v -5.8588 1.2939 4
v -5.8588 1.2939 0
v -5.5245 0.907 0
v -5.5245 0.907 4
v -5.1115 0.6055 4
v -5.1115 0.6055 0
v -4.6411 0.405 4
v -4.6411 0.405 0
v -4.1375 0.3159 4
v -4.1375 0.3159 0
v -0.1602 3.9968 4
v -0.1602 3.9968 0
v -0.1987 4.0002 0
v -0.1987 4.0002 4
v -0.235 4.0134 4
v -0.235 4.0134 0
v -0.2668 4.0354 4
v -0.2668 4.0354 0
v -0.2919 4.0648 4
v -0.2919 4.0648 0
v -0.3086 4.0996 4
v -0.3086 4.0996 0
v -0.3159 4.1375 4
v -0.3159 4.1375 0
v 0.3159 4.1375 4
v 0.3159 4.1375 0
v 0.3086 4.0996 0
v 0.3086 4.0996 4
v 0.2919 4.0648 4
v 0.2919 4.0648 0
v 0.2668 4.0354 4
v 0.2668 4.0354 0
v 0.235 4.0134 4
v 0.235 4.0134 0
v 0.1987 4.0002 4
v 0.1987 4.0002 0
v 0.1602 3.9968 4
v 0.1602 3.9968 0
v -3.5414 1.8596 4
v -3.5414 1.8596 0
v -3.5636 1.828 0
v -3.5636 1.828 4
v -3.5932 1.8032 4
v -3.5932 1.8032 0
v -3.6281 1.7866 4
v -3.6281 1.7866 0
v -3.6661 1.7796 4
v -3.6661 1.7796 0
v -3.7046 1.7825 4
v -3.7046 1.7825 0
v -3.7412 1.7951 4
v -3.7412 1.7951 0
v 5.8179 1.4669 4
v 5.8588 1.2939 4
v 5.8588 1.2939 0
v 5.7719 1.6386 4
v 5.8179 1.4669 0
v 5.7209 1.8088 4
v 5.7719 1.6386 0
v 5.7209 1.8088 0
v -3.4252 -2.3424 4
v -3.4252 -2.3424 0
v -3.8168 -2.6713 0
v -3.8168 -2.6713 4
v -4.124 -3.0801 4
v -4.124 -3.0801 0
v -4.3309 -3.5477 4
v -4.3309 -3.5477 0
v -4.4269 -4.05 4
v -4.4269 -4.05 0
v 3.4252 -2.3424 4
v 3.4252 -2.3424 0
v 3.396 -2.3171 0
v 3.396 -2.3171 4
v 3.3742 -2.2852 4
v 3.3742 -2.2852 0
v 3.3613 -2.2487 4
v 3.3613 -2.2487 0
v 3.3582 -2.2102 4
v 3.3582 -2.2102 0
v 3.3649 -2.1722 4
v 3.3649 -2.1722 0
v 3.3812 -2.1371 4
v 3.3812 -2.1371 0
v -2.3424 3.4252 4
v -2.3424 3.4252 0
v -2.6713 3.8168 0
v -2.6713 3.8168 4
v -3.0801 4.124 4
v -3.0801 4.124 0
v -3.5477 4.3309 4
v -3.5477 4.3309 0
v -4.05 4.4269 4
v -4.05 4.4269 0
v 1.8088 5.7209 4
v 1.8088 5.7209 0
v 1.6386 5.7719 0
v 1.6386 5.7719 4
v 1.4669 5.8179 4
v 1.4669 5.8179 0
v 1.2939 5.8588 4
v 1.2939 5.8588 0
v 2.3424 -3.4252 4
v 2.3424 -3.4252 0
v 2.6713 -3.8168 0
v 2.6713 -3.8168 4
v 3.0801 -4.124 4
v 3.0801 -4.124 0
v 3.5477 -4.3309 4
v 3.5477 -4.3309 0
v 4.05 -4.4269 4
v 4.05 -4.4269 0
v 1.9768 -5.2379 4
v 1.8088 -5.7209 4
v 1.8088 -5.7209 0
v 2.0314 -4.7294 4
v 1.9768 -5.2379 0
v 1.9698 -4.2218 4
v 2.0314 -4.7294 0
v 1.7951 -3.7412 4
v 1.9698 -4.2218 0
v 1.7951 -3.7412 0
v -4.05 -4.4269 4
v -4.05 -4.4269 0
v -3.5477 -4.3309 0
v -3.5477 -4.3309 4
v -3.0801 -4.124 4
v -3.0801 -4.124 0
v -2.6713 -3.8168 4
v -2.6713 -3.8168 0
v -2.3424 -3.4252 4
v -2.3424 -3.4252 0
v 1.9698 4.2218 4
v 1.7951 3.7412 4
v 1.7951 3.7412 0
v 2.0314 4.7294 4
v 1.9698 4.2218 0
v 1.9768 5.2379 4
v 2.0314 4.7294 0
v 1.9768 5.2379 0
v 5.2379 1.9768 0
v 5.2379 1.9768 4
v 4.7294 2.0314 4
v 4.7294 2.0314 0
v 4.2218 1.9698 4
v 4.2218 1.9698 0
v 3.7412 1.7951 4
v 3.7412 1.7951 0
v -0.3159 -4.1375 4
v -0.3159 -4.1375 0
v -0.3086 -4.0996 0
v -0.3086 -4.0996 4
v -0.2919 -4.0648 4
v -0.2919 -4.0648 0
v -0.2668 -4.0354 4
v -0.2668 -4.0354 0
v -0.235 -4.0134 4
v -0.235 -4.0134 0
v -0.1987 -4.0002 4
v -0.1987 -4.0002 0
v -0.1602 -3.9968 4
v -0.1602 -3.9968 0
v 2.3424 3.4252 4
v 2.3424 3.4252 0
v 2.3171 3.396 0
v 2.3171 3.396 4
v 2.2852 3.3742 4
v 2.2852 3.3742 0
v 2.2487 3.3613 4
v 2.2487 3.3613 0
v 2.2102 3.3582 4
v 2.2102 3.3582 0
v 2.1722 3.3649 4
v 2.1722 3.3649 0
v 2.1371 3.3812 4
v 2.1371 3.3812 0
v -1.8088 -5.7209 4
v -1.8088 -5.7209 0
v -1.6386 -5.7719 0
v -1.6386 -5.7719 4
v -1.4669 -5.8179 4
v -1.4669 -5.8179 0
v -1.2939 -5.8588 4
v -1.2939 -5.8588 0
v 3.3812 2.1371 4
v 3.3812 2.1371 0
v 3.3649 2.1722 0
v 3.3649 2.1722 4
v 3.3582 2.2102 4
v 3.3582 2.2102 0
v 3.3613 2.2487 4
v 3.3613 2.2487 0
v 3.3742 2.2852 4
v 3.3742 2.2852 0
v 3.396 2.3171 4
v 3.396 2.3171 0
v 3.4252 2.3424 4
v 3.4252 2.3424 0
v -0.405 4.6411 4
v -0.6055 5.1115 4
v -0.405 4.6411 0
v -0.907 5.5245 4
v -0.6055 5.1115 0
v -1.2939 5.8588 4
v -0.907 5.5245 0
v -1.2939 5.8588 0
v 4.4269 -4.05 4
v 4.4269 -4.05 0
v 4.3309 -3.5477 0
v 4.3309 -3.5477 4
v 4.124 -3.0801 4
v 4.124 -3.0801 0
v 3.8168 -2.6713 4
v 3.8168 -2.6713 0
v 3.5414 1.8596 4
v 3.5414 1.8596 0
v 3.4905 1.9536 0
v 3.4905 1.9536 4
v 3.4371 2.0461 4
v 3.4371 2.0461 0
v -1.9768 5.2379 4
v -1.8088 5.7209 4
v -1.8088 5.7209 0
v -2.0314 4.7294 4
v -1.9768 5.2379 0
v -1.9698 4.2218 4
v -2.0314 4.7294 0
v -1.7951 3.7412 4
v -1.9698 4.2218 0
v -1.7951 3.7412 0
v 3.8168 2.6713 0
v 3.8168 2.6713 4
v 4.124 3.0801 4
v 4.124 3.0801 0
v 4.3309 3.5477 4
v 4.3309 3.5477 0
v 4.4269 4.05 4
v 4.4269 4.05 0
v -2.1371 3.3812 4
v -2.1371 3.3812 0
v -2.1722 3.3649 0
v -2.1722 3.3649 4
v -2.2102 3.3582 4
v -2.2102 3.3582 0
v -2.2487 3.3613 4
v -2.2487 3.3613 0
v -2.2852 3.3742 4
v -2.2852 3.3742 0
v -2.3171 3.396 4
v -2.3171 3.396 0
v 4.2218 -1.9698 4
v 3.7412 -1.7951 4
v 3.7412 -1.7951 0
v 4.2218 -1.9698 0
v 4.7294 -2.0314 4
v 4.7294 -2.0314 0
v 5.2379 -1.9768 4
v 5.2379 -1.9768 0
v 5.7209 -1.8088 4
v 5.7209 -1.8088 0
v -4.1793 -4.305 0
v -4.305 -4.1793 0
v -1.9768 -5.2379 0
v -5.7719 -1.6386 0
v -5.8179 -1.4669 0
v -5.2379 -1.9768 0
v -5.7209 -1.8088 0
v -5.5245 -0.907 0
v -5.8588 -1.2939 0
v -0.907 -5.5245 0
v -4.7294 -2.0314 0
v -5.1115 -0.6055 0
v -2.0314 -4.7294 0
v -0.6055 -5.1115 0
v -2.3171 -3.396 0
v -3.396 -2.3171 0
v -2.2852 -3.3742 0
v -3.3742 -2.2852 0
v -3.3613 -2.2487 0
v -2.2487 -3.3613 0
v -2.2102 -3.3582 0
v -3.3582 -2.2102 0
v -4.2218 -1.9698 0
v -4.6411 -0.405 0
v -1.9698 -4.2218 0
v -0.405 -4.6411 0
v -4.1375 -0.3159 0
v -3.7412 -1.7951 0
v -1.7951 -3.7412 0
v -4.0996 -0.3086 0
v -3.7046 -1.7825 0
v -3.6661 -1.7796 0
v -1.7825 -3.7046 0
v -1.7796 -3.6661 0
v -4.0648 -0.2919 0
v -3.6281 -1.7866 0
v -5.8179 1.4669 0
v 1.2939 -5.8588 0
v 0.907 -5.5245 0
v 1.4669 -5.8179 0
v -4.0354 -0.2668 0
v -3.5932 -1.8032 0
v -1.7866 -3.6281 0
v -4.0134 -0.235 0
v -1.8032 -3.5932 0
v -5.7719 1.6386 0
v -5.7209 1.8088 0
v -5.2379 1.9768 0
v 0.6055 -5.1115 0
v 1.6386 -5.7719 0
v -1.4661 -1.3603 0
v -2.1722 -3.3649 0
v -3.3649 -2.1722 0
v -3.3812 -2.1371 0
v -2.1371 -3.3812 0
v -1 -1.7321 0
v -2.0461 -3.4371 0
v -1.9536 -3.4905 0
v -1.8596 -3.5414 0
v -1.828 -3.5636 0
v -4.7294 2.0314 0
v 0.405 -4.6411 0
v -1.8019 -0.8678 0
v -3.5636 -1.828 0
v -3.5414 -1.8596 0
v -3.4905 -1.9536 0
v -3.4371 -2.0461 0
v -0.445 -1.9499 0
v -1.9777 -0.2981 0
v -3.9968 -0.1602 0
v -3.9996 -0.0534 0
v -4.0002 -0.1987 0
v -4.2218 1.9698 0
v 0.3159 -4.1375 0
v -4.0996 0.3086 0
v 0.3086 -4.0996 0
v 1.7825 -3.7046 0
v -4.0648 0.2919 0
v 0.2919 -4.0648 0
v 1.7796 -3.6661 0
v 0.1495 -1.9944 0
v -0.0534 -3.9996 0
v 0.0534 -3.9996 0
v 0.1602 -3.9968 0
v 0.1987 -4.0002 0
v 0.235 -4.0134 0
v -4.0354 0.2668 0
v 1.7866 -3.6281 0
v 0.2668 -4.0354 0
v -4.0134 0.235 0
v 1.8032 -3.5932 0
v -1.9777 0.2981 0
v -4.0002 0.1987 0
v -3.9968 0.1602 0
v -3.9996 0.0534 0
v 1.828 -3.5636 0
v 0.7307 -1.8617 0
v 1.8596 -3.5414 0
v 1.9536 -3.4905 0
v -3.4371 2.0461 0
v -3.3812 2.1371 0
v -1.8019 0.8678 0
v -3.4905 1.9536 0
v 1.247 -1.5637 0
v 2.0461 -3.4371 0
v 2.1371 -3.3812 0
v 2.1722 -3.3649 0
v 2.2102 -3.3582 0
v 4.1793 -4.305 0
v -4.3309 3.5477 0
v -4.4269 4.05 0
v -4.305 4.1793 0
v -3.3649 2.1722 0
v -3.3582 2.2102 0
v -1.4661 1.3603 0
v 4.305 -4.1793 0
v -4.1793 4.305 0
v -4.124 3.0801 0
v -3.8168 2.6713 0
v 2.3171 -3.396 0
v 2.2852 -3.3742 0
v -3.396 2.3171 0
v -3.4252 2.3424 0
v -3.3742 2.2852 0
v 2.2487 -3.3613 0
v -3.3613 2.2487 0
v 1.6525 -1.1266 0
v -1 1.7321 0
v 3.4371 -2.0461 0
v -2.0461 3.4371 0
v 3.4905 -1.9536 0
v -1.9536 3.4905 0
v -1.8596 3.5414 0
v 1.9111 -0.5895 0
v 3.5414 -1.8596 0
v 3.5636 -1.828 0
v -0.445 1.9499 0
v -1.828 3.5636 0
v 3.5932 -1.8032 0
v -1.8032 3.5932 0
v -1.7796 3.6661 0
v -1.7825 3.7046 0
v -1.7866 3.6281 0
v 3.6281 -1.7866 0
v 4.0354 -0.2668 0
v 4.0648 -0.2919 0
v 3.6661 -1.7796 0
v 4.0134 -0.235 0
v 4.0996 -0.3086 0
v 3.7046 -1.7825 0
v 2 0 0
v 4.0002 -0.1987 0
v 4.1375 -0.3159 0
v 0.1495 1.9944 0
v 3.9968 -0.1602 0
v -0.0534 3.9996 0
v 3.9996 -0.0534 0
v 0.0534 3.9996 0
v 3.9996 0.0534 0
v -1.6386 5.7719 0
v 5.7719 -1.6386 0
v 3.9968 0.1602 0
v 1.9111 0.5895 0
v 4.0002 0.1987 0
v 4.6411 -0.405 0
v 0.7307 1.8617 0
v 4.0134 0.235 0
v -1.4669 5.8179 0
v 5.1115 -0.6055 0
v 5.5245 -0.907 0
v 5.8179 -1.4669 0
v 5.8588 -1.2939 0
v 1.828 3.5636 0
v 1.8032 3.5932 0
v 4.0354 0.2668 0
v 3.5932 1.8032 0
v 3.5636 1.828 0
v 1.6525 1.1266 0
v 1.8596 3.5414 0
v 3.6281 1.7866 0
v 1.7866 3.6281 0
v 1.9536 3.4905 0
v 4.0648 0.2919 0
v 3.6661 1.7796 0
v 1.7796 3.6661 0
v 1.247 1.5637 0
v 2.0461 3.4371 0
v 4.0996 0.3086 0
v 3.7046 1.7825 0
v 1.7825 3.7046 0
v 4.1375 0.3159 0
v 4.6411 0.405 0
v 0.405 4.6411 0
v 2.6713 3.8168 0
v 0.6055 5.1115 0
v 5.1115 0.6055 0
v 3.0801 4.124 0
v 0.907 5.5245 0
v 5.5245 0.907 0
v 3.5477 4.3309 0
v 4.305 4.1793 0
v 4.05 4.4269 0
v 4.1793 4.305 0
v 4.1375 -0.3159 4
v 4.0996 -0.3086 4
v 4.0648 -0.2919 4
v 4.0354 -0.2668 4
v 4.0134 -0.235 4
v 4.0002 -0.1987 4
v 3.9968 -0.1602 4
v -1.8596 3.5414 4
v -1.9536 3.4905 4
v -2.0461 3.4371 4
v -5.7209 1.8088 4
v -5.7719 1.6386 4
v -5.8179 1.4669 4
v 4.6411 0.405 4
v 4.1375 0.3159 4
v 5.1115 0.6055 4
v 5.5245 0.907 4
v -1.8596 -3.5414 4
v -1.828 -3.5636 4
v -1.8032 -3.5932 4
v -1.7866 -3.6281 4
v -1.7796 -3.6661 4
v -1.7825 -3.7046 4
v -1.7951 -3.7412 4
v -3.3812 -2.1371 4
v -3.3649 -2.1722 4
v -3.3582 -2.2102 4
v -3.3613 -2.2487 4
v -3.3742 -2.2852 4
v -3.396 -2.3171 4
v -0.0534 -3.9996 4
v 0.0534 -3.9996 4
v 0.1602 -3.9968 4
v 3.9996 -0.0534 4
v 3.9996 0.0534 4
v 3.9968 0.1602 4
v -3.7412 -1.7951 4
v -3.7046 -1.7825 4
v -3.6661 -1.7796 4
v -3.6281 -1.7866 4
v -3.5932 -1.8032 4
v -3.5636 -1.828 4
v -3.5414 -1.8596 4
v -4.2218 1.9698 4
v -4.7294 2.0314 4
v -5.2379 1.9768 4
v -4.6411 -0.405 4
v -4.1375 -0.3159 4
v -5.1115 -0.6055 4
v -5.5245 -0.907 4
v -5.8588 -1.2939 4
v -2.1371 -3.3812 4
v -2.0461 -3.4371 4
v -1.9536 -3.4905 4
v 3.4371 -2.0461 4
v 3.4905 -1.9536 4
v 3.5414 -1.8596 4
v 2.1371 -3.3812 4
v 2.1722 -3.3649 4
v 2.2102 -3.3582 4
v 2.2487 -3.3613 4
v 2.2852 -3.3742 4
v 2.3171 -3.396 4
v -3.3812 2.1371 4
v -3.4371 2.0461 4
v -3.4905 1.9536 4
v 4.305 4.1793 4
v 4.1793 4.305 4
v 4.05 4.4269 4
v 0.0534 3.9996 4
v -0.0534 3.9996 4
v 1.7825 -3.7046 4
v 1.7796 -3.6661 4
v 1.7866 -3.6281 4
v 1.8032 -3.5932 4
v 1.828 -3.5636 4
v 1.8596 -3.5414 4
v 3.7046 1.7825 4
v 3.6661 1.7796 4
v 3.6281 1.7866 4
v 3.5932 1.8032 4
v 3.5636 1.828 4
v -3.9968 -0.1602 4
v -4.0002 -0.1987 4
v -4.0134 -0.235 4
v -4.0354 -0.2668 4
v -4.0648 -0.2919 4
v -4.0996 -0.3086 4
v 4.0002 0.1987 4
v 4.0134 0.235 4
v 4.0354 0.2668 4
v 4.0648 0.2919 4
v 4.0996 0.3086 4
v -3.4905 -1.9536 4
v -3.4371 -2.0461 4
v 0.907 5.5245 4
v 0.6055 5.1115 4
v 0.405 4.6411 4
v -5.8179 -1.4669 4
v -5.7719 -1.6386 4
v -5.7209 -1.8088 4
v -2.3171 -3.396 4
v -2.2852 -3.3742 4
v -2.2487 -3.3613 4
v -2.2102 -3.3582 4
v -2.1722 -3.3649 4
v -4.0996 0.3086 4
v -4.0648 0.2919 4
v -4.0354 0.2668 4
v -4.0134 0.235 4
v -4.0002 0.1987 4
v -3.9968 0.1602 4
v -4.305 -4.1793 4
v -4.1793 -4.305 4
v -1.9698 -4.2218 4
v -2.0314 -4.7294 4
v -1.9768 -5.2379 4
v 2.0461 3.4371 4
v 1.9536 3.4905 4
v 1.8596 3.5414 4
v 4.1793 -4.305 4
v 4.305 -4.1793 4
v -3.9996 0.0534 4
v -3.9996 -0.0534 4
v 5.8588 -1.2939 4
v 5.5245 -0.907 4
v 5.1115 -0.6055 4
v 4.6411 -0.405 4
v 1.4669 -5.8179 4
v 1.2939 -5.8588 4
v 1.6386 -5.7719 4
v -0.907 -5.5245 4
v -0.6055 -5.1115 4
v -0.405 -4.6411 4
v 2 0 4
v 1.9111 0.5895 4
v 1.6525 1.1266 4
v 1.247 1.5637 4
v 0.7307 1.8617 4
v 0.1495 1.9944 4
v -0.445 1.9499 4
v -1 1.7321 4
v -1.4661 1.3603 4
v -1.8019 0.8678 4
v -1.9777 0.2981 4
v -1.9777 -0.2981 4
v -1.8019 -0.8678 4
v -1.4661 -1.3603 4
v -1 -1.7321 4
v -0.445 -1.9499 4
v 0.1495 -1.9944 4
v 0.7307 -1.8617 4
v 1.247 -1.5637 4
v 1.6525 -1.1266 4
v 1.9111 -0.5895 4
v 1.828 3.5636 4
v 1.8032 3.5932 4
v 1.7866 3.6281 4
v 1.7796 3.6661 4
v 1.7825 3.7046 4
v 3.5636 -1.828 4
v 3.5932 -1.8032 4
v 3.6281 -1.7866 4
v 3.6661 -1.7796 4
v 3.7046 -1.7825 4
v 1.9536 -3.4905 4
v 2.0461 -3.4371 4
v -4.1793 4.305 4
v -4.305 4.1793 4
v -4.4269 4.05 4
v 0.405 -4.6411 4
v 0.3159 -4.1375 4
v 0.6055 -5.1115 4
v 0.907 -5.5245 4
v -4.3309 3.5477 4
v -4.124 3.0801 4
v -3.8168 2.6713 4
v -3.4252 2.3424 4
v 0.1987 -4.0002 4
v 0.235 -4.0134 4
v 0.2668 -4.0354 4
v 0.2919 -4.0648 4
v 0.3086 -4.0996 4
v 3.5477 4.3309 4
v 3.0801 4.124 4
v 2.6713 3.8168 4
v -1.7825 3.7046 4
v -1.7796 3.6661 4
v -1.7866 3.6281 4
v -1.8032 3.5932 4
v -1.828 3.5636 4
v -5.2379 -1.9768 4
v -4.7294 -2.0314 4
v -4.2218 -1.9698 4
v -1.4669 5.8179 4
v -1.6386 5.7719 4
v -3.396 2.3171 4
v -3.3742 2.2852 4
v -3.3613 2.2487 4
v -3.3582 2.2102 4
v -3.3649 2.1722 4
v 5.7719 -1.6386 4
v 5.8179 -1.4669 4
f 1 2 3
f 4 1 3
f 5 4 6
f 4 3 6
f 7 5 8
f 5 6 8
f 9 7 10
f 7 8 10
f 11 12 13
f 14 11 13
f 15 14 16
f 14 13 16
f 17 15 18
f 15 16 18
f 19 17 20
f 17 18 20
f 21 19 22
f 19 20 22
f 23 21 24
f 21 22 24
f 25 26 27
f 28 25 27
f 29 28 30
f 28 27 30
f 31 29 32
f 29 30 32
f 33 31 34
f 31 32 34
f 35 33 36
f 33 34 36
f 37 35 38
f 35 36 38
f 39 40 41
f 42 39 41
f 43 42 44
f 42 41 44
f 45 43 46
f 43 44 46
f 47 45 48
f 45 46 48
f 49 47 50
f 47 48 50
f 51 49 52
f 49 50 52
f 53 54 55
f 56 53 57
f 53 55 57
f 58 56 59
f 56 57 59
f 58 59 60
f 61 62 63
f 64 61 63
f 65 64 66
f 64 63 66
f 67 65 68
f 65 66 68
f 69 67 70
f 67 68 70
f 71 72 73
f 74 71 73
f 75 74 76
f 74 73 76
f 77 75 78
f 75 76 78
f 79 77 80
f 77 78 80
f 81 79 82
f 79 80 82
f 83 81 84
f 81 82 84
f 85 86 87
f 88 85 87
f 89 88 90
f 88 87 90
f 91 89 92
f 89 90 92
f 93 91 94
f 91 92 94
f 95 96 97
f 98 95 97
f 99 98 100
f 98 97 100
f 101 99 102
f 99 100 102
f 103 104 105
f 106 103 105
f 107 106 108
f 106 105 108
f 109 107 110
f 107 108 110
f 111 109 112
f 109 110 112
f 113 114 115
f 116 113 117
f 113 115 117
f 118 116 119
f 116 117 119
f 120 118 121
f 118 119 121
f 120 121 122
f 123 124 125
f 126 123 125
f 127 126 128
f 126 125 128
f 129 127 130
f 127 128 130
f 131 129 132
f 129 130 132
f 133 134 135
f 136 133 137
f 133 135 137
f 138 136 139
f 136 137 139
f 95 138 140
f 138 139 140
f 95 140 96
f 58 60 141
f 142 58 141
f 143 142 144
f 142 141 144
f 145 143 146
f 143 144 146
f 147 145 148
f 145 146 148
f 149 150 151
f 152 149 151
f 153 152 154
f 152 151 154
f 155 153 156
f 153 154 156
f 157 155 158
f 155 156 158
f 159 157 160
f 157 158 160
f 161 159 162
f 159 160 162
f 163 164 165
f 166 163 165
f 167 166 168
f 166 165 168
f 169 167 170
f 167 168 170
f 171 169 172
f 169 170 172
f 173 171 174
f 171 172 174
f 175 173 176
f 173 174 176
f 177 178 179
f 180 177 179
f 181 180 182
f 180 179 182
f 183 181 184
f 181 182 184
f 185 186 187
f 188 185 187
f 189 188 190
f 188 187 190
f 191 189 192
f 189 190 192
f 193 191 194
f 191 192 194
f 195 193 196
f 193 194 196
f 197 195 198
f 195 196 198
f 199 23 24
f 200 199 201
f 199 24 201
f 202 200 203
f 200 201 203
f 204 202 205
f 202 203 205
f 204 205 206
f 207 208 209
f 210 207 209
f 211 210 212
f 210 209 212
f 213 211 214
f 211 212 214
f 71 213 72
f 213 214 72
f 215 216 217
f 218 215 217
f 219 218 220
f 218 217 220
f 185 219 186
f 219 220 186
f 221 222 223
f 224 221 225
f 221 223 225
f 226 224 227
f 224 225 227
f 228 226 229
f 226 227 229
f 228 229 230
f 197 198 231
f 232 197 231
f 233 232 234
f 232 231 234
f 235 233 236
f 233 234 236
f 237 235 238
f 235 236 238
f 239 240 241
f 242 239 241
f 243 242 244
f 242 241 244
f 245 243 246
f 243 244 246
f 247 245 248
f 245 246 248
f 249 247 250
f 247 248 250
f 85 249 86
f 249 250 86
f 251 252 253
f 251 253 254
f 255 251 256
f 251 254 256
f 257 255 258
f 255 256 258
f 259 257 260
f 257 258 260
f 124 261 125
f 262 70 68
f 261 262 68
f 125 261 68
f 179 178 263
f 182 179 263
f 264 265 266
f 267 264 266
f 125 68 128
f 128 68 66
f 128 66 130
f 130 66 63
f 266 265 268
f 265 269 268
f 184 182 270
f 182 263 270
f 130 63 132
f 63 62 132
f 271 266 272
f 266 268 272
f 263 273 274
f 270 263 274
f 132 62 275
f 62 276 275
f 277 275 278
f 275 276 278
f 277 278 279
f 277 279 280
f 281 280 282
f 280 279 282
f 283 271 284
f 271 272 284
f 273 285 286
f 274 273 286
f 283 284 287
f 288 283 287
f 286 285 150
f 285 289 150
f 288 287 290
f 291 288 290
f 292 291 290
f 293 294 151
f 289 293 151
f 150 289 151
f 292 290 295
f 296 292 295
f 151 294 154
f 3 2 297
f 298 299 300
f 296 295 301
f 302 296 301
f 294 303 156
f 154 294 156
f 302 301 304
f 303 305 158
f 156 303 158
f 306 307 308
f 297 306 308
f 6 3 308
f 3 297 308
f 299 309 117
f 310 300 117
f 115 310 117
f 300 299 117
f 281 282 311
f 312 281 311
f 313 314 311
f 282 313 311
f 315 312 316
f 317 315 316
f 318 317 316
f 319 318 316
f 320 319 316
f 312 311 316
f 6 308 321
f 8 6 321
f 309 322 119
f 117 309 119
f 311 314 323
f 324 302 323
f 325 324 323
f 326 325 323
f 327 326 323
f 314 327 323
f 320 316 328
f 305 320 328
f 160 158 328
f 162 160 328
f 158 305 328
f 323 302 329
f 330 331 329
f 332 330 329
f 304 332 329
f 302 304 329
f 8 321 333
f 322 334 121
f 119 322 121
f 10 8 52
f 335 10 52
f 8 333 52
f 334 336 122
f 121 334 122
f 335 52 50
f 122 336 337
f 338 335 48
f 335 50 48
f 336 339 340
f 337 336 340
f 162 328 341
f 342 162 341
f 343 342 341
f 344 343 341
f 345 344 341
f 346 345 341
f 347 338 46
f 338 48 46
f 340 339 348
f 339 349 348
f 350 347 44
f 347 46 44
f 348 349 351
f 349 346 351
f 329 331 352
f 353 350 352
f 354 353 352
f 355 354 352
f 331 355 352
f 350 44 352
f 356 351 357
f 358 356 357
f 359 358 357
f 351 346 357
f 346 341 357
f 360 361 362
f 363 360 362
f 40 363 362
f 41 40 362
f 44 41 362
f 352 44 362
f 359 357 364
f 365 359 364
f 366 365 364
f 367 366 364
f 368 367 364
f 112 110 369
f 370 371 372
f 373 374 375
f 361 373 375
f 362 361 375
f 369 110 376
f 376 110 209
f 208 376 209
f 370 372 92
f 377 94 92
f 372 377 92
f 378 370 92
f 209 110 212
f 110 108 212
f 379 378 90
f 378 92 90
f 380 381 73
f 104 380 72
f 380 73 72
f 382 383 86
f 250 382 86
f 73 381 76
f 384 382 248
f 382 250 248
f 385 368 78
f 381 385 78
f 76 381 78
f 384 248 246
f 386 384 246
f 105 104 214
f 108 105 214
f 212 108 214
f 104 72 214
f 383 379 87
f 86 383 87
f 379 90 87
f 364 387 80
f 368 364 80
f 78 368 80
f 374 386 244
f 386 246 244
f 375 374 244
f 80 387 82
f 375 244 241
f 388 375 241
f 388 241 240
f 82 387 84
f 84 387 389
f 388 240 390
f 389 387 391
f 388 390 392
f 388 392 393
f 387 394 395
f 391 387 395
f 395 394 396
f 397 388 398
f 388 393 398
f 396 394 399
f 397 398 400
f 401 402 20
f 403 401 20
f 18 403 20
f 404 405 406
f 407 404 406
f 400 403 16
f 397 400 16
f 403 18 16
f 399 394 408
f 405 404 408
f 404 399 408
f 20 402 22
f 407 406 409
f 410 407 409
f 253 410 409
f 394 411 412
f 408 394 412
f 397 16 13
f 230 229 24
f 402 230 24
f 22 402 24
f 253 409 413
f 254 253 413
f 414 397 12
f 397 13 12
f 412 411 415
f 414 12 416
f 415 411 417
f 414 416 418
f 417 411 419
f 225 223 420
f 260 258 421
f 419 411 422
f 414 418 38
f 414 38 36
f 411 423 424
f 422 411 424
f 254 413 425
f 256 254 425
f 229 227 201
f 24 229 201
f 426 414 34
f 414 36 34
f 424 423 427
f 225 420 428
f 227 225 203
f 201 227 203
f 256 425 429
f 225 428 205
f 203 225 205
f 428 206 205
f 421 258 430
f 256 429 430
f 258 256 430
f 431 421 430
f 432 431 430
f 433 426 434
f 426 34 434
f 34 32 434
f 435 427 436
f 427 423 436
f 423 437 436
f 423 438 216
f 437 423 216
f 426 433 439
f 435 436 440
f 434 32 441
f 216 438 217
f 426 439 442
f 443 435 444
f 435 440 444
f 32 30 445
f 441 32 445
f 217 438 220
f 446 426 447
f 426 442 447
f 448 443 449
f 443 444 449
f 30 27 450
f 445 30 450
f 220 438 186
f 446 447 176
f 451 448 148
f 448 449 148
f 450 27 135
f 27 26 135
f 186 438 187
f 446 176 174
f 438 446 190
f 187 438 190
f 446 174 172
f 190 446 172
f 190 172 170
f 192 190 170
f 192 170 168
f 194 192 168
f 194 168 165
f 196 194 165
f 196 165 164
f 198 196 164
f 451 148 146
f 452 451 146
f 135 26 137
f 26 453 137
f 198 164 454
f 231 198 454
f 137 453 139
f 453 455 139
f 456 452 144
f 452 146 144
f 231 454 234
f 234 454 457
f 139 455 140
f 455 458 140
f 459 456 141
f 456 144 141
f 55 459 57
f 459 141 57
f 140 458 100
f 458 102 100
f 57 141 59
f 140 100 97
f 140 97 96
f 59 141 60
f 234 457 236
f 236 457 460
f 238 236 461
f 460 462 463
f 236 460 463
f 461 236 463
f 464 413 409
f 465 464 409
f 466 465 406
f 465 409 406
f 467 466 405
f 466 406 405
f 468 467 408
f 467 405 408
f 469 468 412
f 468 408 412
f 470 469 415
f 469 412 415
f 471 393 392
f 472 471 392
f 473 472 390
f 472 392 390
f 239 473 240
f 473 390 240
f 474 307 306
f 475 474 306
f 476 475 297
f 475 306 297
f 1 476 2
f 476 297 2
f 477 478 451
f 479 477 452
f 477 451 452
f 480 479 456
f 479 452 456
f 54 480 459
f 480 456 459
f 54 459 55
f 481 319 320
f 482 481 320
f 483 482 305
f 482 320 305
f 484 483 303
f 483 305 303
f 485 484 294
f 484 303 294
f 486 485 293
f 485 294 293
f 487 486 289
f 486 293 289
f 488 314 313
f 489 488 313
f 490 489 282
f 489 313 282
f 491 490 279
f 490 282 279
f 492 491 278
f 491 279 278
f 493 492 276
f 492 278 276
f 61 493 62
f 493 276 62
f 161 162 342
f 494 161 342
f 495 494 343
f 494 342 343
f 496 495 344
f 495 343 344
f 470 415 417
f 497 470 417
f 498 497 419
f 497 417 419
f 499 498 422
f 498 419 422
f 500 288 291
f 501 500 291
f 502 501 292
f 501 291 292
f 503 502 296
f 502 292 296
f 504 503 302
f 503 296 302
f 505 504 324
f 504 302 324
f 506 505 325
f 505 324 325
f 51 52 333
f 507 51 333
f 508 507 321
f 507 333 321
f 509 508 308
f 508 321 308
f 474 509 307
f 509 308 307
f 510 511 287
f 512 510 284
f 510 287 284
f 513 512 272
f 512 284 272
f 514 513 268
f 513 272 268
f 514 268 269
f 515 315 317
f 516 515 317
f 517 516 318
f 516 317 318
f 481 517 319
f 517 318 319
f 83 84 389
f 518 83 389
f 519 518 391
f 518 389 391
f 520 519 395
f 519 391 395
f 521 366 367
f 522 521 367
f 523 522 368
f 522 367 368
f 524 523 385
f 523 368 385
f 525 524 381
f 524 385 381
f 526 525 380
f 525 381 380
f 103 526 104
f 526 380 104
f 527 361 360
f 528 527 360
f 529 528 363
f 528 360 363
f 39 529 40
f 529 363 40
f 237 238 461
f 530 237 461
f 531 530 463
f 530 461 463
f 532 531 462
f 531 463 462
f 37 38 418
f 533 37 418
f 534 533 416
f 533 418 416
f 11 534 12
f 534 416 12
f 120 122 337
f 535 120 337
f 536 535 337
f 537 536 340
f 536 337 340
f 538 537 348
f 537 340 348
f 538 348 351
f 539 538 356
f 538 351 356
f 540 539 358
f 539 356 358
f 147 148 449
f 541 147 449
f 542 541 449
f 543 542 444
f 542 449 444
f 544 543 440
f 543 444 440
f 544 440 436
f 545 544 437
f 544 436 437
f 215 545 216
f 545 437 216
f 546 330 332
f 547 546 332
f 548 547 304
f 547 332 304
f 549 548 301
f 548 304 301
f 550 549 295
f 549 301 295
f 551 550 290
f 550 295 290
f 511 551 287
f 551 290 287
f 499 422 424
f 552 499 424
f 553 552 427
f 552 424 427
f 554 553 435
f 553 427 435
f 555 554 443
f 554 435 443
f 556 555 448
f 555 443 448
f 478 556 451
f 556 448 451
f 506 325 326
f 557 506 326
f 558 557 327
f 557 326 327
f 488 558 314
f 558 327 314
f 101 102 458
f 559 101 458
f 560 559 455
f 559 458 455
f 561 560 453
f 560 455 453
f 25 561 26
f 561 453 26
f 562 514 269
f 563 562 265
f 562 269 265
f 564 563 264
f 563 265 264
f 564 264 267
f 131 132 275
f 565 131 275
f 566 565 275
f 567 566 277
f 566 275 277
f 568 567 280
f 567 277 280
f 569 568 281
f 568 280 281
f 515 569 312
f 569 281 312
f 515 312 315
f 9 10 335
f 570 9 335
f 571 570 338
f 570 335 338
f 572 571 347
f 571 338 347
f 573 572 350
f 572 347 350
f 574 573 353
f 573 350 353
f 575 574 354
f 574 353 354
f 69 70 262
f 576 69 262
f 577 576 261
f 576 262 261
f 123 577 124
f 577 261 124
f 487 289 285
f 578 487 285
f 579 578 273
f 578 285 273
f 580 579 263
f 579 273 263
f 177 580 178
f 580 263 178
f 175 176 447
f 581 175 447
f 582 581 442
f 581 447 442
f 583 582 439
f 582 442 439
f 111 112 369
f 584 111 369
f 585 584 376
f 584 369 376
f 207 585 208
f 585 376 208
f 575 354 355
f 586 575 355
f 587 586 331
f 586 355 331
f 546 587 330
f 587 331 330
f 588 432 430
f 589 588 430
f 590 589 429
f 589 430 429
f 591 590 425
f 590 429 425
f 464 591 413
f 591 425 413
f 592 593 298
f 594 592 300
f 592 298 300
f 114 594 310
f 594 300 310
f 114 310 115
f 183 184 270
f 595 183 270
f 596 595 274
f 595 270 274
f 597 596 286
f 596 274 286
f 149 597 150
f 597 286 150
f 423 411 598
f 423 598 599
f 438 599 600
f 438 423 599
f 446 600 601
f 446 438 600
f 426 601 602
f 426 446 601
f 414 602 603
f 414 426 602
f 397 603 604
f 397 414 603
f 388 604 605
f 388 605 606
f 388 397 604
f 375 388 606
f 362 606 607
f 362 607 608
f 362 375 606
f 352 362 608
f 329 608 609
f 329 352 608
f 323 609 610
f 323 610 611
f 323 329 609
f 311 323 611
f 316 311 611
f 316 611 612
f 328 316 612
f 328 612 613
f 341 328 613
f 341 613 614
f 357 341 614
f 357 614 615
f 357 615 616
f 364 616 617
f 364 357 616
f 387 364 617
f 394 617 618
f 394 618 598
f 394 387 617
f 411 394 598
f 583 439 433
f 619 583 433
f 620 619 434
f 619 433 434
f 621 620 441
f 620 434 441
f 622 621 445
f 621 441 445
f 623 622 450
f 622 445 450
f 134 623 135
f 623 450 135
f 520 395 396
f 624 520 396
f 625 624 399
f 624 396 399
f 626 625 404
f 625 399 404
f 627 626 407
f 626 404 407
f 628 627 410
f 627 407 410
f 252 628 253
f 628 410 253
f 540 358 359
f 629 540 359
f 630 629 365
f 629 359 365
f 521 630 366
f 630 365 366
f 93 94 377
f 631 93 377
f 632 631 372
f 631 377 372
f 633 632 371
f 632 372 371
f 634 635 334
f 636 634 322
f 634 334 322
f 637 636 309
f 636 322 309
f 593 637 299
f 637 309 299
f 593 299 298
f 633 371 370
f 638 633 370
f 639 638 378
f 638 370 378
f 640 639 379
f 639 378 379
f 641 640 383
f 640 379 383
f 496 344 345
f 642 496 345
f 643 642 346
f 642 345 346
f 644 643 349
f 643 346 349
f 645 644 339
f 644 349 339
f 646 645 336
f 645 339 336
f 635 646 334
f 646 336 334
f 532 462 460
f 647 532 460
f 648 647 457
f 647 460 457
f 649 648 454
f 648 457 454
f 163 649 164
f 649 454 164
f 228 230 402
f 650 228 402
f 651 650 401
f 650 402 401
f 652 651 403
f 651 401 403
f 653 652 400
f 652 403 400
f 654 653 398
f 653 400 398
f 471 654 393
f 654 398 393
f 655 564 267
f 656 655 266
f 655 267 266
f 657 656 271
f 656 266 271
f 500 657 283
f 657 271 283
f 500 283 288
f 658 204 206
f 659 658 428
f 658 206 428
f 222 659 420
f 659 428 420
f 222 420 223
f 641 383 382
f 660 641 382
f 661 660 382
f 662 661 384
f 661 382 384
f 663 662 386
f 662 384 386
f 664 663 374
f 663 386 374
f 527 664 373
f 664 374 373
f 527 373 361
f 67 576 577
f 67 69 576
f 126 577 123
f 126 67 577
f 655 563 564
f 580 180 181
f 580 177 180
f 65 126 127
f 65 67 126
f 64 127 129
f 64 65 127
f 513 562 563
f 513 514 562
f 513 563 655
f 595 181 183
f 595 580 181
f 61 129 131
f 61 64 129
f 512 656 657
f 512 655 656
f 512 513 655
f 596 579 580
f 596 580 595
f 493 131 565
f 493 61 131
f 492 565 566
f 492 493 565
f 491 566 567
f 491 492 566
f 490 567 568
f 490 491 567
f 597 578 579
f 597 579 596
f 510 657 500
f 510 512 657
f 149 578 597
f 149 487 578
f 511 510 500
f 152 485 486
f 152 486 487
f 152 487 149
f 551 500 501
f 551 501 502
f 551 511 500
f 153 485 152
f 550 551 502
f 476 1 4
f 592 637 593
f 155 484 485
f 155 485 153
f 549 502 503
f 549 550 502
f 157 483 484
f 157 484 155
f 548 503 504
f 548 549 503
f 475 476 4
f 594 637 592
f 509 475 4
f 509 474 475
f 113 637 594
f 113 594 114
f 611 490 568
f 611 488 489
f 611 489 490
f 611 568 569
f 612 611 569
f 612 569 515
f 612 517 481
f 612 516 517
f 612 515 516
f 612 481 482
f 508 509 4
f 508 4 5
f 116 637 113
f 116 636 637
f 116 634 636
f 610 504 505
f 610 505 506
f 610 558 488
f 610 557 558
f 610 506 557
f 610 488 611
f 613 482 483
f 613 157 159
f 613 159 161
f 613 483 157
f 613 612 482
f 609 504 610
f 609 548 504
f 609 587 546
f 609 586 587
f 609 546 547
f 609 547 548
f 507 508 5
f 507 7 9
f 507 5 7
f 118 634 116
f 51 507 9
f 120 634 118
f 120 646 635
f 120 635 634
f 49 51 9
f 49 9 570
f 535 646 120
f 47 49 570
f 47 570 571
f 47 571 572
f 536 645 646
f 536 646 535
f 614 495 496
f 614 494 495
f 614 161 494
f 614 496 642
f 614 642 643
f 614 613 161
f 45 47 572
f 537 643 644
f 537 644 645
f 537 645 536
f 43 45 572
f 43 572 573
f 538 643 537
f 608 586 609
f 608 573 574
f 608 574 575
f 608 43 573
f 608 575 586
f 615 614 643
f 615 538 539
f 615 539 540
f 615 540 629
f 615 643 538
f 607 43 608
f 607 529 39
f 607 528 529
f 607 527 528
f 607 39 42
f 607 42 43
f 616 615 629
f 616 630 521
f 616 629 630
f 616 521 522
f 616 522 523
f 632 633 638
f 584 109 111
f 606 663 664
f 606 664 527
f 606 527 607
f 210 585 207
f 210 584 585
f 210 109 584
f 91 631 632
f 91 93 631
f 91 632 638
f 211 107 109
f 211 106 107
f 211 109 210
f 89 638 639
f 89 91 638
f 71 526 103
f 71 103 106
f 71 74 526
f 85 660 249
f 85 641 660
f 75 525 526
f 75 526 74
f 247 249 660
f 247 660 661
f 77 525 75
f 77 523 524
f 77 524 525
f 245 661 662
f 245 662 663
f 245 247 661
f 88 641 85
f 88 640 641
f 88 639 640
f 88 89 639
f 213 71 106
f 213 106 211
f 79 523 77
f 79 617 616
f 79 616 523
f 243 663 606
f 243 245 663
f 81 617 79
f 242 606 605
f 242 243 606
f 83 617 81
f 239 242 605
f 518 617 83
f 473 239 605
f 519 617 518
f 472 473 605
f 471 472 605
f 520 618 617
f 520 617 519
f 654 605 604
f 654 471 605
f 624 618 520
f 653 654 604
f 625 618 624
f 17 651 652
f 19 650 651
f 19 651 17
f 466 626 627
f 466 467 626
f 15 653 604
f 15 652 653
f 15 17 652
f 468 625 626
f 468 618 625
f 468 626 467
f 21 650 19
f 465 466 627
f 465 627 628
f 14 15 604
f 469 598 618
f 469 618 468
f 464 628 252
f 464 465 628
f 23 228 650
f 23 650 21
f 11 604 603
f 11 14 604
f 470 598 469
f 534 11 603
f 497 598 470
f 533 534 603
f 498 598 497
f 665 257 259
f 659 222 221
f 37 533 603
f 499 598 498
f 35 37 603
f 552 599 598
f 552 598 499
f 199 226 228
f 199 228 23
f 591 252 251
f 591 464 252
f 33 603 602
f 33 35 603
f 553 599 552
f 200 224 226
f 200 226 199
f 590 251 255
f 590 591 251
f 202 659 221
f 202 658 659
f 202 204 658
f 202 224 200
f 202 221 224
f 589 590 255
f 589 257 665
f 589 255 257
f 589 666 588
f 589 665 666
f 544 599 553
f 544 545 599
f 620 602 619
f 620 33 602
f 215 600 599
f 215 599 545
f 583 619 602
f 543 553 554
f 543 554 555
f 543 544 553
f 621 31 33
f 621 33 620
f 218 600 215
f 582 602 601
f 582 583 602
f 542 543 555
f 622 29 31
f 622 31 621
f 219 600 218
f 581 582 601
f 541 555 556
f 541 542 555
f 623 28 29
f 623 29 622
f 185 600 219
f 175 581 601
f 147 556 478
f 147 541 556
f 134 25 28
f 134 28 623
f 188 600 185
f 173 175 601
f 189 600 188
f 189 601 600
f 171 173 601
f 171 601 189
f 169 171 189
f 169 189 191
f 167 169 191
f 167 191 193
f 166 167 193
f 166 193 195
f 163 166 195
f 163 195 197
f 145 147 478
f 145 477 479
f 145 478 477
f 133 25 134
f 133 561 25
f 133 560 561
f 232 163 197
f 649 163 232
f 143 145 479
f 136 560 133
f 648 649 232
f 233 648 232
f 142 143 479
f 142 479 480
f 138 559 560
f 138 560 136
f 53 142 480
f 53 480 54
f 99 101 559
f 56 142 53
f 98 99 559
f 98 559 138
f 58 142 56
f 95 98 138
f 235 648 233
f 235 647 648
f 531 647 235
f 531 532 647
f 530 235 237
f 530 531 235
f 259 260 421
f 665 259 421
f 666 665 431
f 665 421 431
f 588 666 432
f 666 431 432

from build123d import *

# Parameters (mm, degrees)
SKETCH1_R           = 6
SKETCH1_R_2         = 2
BOSS_EXTRUDE1_DEPTH = 4
CUT_EXTRUDE2_DEPTH  = 5
CIRPATTERN2_COUNT   = 12


with BuildPart() as part:
    # Sketch1 → Boss-Extrude1 (new body)
    with BuildSketch(Plane.XY):
        Circle(SKETCH1_R)
        Circle(SKETCH1_R_2, mode=Mode.SUBTRACT)
    extrude(amount=BOSS_EXTRUDE1_DEPTH)

    # Sketch4 → Cut-Extrude2 (cut, through all)
    with BuildSketch(Plane.XY):
        with BuildLine():
            ThreePointArc((-0.160215471, 3.996790087), (-0.266788325, 4.035374045), (-0.315943185, 4.137502858))
            ThreePointArc((-0.315943185, 4.137502858), (-0.829511973, 5.435929685), (-2.010193861, 6.181352655))
            ThreePointArc((-2.010193861, 6.181352655), (0, 6.5), (2.010193861, 6.181352655))
            ThreePointArc((2.010193861, 6.181352655), (0.829511973, 5.435929685), (0.315943185, 4.137502858))
            ThreePointArc((0.315943185, 4.137502858), (0.266788325, 4.035374045), (0.160215471, 3.996790087))
            ThreePointArc((0.160215471, 3.996790087), (0, 4), (-0.160215471, 3.996790087))
        make_face()
    cut_extrude2 = extrude(amount=CUT_EXTRUDE2_DEPTH, mode=Mode.SUBTRACT)

    # CirPattern2: Cut-Extrude2 ×12 about axis
    cirpattern2_axis = Axis((0, 0, 0), (0, 0, 1))
    for i in range(1, CIRPATTERN2_COUNT):
        add(cut_extrude2.rotate(cirpattern2_axis, i * 360 / CIRPATTERN2_COUNT), mode=Mode.SUBTRACT)


solid = part.part
